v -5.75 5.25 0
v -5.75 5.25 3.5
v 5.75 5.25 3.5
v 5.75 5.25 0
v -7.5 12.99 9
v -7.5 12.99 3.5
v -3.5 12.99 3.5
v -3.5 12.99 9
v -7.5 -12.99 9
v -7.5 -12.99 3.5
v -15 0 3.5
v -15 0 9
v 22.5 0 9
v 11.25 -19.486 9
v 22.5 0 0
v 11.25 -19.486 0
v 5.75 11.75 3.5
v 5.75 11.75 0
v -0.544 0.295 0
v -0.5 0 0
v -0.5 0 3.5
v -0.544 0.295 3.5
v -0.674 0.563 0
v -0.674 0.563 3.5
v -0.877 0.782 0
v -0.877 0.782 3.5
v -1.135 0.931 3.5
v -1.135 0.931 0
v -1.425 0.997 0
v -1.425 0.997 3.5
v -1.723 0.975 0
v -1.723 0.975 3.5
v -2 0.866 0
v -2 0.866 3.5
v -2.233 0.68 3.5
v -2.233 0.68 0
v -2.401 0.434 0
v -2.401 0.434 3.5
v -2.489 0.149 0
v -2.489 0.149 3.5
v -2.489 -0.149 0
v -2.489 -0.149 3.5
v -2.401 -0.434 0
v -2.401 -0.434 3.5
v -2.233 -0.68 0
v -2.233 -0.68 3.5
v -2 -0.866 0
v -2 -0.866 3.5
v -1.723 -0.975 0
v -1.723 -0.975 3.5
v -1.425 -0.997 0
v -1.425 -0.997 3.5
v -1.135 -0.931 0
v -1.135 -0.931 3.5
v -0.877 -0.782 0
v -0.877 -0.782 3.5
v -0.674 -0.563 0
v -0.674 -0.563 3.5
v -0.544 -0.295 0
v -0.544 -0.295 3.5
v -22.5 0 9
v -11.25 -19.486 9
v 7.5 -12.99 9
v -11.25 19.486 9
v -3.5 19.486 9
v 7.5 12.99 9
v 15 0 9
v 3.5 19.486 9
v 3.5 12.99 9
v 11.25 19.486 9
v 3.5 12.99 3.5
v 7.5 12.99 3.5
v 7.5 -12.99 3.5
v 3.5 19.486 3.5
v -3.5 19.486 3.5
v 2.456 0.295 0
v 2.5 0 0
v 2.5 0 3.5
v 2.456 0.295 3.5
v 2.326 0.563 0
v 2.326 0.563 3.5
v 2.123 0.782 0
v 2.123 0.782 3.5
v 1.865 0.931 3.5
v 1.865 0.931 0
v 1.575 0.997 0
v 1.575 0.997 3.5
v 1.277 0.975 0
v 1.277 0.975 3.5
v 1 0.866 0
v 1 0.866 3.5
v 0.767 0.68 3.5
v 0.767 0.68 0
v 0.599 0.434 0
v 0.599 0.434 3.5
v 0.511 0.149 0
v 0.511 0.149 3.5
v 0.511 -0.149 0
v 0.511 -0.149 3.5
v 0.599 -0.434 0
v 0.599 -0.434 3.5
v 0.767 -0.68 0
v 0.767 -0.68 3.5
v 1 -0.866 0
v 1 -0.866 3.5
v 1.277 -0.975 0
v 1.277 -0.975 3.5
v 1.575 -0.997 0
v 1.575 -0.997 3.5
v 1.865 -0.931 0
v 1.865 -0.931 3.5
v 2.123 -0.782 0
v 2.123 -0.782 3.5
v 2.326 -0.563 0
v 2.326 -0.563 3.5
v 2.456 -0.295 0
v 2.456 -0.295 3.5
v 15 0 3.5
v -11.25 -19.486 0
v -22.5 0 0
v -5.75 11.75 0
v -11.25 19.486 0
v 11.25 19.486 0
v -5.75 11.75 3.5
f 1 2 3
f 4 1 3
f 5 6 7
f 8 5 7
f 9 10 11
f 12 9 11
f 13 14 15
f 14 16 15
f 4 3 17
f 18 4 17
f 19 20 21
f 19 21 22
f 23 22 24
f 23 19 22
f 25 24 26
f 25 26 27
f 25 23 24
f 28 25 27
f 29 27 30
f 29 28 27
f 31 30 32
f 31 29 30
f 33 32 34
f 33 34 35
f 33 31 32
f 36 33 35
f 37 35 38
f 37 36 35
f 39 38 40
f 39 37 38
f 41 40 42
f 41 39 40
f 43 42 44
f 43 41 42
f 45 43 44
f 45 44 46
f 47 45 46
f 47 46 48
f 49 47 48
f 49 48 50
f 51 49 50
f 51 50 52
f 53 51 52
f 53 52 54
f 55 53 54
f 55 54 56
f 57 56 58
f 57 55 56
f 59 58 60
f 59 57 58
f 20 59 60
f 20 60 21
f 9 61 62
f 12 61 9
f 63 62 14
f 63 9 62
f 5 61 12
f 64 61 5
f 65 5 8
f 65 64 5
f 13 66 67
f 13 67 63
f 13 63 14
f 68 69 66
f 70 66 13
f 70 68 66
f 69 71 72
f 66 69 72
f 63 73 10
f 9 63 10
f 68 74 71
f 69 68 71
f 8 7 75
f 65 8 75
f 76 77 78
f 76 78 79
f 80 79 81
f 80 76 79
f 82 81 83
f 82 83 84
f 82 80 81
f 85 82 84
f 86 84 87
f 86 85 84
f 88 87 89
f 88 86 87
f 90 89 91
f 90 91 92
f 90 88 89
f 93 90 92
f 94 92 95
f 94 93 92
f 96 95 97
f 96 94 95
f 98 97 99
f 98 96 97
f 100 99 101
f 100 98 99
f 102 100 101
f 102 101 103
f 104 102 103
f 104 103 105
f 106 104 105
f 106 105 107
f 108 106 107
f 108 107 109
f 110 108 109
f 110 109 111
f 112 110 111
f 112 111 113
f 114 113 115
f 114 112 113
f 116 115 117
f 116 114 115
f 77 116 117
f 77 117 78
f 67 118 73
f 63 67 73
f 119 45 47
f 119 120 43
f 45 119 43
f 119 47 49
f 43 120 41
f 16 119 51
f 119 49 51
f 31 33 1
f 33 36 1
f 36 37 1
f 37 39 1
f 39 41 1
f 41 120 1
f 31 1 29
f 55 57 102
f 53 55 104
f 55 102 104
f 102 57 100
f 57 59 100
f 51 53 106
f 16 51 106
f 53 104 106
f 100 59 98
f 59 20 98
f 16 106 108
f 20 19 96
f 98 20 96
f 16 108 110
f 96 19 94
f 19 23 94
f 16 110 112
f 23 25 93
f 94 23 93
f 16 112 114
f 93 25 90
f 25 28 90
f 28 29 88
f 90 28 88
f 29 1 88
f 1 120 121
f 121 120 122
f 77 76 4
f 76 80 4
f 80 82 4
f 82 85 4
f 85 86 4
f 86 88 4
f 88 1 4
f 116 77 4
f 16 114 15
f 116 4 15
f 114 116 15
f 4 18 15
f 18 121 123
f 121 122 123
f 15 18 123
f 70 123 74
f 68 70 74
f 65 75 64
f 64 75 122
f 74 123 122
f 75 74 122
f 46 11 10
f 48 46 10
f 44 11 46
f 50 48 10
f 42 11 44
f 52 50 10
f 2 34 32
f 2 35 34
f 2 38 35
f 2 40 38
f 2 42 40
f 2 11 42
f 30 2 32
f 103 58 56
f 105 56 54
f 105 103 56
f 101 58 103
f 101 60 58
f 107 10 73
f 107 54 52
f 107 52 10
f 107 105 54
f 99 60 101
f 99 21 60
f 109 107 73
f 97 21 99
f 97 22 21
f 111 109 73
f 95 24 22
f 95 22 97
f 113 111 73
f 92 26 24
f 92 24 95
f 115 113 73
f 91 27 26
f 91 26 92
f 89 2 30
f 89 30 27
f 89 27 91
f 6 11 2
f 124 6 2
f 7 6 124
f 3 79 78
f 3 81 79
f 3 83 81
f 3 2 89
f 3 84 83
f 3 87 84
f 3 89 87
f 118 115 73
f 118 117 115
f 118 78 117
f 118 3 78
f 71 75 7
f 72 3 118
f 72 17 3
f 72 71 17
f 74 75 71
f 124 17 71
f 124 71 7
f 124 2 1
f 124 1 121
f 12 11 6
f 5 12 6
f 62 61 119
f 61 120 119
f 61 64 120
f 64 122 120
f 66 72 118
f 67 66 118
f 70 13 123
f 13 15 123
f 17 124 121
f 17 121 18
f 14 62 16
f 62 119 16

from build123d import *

# Parameters (mm, degrees)
F0_R     = 1
F1_DEPTH = 3.5
F3_DEPTH = 5.5
F4_W     = 11.5
F4_H     = 6.5
F5_DEPTH = 3.5


with BuildPart() as f1:
    # F0 (on Top) → F1 (new body)
    with BuildSketch(Plane.XY):
        Polygon((11.25, -19.485572), (22.5, 0), (11.25, 19.485572), (-11.25, 19.485572), (-22.5, 0), (-11.25, -19.485572), align=None)
        with Locations((-1.5, 0)):
            Circle(F0_R, mode=Mode.SUBTRACT)
        with Locations((1.5, 0)):
            Circle(F0_R, mode=Mode.SUBTRACT)
    extrude(amount=F1_DEPTH)

    # F2 (on face) → F3 (join)
    with BuildSketch(Plane.XY.offset(3.5)):
        Polygon((7.5, 12.990381), (15, 0), (7.5, -12.990381), (-7.5, -12.990381), (-15, 0), (-7.5, 12.990381), (-3.5, 12.990381), (-3.5, 19.485572), (-11.25, 19.485572), (-22.5, 0), (-11.25, -19.485572), (11.25, -19.485572), (22.5, 0), (11.25, 19.485572), (3.5, 19.485572), (3.5, 12.990381), align=None)
    extrude(amount=F3_DEPTH)

    # F4 (on face) → F5 (cut, through all)
    with BuildSketch(Plane.XY.offset(3.5)):
        with Locations((0, 8.5)):
            Rectangle(F4_W, F4_H)
    extrude(amount=-F5_DEPTH, mode=Mode.SUBTRACT)


solid = f1.part
